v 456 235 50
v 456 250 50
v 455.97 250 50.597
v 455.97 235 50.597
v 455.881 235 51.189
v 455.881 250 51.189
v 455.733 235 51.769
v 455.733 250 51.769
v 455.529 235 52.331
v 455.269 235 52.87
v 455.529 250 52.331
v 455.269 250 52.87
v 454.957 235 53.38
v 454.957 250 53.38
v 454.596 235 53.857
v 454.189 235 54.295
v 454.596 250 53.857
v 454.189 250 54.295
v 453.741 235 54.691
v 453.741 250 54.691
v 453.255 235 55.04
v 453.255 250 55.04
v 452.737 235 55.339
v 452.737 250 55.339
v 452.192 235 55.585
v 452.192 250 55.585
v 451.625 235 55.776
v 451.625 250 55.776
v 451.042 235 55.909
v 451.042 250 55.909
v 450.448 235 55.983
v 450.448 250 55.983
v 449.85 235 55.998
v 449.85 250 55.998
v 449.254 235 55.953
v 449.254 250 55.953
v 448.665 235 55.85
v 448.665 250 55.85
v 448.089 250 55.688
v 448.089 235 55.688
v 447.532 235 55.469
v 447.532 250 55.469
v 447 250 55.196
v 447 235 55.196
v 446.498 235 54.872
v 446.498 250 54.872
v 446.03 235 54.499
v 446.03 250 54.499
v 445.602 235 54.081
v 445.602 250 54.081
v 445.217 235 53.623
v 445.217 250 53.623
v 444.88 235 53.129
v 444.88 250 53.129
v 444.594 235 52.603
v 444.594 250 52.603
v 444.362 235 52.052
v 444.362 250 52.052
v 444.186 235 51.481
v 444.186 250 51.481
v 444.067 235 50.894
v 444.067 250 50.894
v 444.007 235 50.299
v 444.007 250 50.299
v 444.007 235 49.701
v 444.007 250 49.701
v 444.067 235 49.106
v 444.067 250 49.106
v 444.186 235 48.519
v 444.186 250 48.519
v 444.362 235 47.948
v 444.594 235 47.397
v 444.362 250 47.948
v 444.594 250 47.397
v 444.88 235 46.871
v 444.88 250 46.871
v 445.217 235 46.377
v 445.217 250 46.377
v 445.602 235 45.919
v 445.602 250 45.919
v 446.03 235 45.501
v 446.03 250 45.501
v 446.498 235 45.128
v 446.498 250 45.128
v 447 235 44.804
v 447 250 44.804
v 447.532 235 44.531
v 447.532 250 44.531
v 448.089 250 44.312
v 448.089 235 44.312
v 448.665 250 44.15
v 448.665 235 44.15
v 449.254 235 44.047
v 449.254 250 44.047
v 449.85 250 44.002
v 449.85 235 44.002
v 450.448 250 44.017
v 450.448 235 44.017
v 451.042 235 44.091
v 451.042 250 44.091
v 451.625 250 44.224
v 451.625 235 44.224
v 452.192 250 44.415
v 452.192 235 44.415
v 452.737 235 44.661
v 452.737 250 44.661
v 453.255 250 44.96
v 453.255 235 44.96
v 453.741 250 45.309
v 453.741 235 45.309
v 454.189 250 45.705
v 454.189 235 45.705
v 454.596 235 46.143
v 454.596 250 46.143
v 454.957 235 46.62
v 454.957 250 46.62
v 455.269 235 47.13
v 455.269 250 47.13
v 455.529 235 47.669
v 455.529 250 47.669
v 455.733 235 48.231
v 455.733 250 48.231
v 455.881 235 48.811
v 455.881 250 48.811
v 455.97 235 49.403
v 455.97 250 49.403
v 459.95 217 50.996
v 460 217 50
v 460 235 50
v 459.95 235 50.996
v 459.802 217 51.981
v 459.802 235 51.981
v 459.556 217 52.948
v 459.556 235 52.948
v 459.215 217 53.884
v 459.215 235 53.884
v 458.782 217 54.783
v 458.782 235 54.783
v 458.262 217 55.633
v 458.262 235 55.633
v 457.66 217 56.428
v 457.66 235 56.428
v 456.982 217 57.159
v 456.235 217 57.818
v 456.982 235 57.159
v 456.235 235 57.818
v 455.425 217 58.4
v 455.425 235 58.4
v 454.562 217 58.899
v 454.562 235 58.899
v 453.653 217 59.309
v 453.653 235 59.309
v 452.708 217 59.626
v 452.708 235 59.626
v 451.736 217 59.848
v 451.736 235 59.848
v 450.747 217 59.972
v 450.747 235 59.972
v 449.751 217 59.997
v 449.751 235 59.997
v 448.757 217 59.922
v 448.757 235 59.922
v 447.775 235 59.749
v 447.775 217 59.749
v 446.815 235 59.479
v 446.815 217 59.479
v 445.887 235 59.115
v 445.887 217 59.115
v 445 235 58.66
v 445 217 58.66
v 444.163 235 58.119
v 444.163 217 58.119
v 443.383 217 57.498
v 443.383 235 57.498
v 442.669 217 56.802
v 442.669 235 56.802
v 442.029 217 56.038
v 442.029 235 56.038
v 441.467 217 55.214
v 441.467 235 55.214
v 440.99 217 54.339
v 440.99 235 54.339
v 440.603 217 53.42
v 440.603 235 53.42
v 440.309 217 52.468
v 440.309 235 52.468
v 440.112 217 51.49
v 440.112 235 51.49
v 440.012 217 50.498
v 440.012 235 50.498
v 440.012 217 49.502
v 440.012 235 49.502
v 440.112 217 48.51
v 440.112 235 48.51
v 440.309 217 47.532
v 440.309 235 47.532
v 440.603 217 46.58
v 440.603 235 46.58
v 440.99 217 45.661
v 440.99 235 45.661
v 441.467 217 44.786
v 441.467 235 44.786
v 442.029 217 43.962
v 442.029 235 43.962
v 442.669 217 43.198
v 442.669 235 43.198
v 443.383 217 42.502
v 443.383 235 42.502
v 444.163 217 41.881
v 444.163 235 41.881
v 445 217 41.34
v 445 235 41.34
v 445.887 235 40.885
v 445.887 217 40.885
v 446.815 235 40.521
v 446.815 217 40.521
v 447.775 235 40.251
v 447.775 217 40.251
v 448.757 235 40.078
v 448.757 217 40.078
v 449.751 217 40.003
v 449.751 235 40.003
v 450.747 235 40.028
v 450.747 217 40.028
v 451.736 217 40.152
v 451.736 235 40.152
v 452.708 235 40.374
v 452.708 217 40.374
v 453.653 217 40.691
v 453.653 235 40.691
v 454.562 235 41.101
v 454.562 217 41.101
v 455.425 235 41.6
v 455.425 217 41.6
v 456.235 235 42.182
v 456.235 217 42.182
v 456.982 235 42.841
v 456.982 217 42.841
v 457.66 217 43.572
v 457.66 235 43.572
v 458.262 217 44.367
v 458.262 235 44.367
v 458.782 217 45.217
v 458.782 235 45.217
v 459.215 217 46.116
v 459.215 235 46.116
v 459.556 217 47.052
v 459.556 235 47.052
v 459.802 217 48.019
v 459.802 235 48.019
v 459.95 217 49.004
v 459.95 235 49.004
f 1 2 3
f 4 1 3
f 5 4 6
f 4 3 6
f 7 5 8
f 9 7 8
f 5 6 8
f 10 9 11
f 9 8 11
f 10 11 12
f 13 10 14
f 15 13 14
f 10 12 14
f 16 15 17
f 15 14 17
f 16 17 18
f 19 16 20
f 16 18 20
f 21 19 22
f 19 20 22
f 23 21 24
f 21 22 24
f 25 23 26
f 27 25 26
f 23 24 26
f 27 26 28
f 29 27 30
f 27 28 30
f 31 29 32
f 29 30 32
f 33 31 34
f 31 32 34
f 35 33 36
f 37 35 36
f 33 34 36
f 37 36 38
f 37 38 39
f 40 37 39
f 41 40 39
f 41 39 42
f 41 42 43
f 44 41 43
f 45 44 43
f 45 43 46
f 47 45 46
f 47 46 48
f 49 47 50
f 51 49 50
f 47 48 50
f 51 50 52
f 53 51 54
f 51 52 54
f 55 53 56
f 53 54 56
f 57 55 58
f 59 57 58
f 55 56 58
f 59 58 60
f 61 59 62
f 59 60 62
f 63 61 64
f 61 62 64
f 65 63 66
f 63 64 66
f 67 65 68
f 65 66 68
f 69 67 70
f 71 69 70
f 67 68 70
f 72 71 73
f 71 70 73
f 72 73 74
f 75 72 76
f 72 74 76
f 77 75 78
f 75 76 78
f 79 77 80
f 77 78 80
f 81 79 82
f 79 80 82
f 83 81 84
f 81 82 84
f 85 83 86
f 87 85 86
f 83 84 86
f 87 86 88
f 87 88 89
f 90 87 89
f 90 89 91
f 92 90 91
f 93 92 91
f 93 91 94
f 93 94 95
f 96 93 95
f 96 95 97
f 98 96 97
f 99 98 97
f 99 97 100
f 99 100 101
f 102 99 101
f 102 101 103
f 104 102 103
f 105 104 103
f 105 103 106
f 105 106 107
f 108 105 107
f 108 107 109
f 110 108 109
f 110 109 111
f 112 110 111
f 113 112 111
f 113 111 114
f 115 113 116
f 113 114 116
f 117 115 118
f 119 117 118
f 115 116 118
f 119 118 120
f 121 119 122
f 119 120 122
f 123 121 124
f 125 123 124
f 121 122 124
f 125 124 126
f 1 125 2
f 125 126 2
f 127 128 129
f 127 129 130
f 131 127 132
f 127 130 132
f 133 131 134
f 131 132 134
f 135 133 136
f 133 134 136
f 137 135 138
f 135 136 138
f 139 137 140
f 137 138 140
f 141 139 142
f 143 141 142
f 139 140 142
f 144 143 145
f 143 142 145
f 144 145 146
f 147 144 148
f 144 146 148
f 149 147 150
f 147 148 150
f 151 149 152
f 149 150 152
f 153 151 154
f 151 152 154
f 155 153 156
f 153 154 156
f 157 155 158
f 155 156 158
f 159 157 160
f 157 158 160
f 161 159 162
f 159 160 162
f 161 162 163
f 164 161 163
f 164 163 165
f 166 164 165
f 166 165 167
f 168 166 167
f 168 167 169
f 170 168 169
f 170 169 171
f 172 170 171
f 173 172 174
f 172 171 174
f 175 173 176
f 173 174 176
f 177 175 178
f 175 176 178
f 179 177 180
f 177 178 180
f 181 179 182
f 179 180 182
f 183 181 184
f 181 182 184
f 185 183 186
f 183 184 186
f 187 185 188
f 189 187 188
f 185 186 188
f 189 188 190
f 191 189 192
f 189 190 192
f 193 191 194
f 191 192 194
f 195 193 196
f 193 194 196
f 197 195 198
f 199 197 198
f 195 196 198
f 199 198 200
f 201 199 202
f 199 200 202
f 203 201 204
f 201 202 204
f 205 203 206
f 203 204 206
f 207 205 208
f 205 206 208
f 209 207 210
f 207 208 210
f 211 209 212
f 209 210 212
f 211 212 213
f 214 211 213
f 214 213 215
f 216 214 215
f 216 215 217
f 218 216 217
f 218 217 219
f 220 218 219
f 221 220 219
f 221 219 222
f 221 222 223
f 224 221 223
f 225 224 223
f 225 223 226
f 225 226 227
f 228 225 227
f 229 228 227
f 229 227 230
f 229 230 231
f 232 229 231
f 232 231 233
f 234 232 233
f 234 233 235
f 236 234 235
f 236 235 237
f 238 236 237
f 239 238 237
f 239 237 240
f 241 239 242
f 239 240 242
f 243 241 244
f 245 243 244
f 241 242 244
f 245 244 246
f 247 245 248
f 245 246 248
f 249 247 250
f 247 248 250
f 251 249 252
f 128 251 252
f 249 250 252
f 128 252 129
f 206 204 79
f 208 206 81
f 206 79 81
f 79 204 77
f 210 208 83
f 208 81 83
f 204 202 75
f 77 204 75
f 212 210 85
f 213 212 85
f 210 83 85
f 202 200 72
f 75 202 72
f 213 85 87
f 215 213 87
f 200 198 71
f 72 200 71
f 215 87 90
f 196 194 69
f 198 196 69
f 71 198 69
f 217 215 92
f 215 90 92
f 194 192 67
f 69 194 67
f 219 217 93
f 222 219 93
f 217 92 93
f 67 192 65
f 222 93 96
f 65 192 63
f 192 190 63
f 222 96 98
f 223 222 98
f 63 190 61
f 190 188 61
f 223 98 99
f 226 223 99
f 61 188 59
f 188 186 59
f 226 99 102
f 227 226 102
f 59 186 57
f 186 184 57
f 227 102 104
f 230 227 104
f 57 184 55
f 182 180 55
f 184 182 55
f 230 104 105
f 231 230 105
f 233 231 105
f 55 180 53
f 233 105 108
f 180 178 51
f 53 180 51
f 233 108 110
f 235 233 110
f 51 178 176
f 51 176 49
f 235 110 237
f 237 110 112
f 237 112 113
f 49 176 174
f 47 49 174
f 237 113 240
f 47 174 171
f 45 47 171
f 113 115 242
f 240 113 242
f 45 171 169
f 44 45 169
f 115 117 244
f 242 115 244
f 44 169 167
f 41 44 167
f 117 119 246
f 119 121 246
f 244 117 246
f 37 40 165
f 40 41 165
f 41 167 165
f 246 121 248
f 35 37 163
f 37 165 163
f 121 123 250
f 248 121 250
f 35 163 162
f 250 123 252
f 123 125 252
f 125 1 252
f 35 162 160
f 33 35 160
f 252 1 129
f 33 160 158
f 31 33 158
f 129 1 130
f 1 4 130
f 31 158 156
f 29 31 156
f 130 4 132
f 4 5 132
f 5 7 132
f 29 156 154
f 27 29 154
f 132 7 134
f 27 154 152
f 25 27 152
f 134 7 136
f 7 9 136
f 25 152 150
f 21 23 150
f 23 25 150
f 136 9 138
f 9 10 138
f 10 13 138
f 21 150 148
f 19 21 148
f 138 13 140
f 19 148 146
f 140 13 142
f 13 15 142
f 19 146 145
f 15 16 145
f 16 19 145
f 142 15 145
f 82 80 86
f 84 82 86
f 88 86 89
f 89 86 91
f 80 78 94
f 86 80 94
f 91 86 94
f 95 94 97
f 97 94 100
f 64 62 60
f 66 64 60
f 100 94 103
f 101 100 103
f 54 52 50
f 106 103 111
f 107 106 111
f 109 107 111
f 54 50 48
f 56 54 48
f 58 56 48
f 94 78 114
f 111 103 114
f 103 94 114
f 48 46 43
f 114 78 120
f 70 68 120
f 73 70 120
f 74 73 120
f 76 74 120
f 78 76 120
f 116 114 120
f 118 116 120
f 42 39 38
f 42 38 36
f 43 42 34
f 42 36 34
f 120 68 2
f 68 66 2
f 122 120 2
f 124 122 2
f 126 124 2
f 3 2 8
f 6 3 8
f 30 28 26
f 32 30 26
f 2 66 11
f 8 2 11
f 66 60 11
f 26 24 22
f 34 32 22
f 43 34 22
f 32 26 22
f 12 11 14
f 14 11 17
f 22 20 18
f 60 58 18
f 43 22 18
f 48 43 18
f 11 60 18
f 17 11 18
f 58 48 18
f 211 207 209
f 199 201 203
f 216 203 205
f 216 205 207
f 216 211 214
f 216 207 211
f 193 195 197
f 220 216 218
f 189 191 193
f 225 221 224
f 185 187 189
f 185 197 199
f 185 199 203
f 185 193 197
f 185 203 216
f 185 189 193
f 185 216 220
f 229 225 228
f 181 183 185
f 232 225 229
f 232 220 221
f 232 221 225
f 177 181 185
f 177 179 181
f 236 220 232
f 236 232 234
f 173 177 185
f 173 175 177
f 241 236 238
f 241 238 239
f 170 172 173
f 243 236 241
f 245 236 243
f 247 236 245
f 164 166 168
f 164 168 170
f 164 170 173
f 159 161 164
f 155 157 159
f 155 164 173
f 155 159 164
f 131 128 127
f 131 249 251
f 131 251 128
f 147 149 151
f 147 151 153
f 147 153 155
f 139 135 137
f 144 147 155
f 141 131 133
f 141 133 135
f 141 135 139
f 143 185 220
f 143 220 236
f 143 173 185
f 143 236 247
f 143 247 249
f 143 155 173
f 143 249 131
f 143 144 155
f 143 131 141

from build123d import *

# Parameters (mm, degrees)
CYLINDER006_R          = 6
CYLINDER006_DEPTH      = 15
CYLINDER006_ROLL_ANGLE = 90
CYLINDER_R             = 10
CYLINDER_DEPTH         = 18
CYLINDER_ROLL_ANGLE    = 90


with BuildPart() as cylinder006:
    # Cylinder006 → Cylinder006 (new body)
    with BuildSketch(Plane.XY):
        Circle(CYLINDER006_R)
    extrude(amount=CYLINDER006_DEPTH)


with BuildPart() as cylinder006_1:
    # Cylinder006 roll: moved
    add(cylinder006.part.rotate(Axis((0, 0, 0), (1, 0, 0)), CYLINDER006_ROLL_ANGLE))


with BuildPart() as cylinder006_2:
    # Cylinder006 placement: moved
    add(cylinder006_1.part.moved(Location((450, 250, 50))))


with BuildPart() as pv_input_plug001:
    # Cylinder → Cylinder (new body)
    with BuildSketch(Plane.XY):
        Circle(CYLINDER_R)
    extrude(amount=CYLINDER_DEPTH)


with BuildPart() as pv_input_plug001_1:
    # Cylinder roll: moved
    add(pv_input_plug001.part.rotate(Axis((0, 0, 0), (1, 0, 0)), CYLINDER_ROLL_ANGLE))


with BuildPart() as pv_input_plug001_2:
    # Cylinder placement: moved
    add(pv_input_plug001_1.part.moved(Location((450, 235, 50))))

    # Fusion: union Cylinder006
    add(cylinder006_2.part)


solid = pv_input_plug001_2.part
